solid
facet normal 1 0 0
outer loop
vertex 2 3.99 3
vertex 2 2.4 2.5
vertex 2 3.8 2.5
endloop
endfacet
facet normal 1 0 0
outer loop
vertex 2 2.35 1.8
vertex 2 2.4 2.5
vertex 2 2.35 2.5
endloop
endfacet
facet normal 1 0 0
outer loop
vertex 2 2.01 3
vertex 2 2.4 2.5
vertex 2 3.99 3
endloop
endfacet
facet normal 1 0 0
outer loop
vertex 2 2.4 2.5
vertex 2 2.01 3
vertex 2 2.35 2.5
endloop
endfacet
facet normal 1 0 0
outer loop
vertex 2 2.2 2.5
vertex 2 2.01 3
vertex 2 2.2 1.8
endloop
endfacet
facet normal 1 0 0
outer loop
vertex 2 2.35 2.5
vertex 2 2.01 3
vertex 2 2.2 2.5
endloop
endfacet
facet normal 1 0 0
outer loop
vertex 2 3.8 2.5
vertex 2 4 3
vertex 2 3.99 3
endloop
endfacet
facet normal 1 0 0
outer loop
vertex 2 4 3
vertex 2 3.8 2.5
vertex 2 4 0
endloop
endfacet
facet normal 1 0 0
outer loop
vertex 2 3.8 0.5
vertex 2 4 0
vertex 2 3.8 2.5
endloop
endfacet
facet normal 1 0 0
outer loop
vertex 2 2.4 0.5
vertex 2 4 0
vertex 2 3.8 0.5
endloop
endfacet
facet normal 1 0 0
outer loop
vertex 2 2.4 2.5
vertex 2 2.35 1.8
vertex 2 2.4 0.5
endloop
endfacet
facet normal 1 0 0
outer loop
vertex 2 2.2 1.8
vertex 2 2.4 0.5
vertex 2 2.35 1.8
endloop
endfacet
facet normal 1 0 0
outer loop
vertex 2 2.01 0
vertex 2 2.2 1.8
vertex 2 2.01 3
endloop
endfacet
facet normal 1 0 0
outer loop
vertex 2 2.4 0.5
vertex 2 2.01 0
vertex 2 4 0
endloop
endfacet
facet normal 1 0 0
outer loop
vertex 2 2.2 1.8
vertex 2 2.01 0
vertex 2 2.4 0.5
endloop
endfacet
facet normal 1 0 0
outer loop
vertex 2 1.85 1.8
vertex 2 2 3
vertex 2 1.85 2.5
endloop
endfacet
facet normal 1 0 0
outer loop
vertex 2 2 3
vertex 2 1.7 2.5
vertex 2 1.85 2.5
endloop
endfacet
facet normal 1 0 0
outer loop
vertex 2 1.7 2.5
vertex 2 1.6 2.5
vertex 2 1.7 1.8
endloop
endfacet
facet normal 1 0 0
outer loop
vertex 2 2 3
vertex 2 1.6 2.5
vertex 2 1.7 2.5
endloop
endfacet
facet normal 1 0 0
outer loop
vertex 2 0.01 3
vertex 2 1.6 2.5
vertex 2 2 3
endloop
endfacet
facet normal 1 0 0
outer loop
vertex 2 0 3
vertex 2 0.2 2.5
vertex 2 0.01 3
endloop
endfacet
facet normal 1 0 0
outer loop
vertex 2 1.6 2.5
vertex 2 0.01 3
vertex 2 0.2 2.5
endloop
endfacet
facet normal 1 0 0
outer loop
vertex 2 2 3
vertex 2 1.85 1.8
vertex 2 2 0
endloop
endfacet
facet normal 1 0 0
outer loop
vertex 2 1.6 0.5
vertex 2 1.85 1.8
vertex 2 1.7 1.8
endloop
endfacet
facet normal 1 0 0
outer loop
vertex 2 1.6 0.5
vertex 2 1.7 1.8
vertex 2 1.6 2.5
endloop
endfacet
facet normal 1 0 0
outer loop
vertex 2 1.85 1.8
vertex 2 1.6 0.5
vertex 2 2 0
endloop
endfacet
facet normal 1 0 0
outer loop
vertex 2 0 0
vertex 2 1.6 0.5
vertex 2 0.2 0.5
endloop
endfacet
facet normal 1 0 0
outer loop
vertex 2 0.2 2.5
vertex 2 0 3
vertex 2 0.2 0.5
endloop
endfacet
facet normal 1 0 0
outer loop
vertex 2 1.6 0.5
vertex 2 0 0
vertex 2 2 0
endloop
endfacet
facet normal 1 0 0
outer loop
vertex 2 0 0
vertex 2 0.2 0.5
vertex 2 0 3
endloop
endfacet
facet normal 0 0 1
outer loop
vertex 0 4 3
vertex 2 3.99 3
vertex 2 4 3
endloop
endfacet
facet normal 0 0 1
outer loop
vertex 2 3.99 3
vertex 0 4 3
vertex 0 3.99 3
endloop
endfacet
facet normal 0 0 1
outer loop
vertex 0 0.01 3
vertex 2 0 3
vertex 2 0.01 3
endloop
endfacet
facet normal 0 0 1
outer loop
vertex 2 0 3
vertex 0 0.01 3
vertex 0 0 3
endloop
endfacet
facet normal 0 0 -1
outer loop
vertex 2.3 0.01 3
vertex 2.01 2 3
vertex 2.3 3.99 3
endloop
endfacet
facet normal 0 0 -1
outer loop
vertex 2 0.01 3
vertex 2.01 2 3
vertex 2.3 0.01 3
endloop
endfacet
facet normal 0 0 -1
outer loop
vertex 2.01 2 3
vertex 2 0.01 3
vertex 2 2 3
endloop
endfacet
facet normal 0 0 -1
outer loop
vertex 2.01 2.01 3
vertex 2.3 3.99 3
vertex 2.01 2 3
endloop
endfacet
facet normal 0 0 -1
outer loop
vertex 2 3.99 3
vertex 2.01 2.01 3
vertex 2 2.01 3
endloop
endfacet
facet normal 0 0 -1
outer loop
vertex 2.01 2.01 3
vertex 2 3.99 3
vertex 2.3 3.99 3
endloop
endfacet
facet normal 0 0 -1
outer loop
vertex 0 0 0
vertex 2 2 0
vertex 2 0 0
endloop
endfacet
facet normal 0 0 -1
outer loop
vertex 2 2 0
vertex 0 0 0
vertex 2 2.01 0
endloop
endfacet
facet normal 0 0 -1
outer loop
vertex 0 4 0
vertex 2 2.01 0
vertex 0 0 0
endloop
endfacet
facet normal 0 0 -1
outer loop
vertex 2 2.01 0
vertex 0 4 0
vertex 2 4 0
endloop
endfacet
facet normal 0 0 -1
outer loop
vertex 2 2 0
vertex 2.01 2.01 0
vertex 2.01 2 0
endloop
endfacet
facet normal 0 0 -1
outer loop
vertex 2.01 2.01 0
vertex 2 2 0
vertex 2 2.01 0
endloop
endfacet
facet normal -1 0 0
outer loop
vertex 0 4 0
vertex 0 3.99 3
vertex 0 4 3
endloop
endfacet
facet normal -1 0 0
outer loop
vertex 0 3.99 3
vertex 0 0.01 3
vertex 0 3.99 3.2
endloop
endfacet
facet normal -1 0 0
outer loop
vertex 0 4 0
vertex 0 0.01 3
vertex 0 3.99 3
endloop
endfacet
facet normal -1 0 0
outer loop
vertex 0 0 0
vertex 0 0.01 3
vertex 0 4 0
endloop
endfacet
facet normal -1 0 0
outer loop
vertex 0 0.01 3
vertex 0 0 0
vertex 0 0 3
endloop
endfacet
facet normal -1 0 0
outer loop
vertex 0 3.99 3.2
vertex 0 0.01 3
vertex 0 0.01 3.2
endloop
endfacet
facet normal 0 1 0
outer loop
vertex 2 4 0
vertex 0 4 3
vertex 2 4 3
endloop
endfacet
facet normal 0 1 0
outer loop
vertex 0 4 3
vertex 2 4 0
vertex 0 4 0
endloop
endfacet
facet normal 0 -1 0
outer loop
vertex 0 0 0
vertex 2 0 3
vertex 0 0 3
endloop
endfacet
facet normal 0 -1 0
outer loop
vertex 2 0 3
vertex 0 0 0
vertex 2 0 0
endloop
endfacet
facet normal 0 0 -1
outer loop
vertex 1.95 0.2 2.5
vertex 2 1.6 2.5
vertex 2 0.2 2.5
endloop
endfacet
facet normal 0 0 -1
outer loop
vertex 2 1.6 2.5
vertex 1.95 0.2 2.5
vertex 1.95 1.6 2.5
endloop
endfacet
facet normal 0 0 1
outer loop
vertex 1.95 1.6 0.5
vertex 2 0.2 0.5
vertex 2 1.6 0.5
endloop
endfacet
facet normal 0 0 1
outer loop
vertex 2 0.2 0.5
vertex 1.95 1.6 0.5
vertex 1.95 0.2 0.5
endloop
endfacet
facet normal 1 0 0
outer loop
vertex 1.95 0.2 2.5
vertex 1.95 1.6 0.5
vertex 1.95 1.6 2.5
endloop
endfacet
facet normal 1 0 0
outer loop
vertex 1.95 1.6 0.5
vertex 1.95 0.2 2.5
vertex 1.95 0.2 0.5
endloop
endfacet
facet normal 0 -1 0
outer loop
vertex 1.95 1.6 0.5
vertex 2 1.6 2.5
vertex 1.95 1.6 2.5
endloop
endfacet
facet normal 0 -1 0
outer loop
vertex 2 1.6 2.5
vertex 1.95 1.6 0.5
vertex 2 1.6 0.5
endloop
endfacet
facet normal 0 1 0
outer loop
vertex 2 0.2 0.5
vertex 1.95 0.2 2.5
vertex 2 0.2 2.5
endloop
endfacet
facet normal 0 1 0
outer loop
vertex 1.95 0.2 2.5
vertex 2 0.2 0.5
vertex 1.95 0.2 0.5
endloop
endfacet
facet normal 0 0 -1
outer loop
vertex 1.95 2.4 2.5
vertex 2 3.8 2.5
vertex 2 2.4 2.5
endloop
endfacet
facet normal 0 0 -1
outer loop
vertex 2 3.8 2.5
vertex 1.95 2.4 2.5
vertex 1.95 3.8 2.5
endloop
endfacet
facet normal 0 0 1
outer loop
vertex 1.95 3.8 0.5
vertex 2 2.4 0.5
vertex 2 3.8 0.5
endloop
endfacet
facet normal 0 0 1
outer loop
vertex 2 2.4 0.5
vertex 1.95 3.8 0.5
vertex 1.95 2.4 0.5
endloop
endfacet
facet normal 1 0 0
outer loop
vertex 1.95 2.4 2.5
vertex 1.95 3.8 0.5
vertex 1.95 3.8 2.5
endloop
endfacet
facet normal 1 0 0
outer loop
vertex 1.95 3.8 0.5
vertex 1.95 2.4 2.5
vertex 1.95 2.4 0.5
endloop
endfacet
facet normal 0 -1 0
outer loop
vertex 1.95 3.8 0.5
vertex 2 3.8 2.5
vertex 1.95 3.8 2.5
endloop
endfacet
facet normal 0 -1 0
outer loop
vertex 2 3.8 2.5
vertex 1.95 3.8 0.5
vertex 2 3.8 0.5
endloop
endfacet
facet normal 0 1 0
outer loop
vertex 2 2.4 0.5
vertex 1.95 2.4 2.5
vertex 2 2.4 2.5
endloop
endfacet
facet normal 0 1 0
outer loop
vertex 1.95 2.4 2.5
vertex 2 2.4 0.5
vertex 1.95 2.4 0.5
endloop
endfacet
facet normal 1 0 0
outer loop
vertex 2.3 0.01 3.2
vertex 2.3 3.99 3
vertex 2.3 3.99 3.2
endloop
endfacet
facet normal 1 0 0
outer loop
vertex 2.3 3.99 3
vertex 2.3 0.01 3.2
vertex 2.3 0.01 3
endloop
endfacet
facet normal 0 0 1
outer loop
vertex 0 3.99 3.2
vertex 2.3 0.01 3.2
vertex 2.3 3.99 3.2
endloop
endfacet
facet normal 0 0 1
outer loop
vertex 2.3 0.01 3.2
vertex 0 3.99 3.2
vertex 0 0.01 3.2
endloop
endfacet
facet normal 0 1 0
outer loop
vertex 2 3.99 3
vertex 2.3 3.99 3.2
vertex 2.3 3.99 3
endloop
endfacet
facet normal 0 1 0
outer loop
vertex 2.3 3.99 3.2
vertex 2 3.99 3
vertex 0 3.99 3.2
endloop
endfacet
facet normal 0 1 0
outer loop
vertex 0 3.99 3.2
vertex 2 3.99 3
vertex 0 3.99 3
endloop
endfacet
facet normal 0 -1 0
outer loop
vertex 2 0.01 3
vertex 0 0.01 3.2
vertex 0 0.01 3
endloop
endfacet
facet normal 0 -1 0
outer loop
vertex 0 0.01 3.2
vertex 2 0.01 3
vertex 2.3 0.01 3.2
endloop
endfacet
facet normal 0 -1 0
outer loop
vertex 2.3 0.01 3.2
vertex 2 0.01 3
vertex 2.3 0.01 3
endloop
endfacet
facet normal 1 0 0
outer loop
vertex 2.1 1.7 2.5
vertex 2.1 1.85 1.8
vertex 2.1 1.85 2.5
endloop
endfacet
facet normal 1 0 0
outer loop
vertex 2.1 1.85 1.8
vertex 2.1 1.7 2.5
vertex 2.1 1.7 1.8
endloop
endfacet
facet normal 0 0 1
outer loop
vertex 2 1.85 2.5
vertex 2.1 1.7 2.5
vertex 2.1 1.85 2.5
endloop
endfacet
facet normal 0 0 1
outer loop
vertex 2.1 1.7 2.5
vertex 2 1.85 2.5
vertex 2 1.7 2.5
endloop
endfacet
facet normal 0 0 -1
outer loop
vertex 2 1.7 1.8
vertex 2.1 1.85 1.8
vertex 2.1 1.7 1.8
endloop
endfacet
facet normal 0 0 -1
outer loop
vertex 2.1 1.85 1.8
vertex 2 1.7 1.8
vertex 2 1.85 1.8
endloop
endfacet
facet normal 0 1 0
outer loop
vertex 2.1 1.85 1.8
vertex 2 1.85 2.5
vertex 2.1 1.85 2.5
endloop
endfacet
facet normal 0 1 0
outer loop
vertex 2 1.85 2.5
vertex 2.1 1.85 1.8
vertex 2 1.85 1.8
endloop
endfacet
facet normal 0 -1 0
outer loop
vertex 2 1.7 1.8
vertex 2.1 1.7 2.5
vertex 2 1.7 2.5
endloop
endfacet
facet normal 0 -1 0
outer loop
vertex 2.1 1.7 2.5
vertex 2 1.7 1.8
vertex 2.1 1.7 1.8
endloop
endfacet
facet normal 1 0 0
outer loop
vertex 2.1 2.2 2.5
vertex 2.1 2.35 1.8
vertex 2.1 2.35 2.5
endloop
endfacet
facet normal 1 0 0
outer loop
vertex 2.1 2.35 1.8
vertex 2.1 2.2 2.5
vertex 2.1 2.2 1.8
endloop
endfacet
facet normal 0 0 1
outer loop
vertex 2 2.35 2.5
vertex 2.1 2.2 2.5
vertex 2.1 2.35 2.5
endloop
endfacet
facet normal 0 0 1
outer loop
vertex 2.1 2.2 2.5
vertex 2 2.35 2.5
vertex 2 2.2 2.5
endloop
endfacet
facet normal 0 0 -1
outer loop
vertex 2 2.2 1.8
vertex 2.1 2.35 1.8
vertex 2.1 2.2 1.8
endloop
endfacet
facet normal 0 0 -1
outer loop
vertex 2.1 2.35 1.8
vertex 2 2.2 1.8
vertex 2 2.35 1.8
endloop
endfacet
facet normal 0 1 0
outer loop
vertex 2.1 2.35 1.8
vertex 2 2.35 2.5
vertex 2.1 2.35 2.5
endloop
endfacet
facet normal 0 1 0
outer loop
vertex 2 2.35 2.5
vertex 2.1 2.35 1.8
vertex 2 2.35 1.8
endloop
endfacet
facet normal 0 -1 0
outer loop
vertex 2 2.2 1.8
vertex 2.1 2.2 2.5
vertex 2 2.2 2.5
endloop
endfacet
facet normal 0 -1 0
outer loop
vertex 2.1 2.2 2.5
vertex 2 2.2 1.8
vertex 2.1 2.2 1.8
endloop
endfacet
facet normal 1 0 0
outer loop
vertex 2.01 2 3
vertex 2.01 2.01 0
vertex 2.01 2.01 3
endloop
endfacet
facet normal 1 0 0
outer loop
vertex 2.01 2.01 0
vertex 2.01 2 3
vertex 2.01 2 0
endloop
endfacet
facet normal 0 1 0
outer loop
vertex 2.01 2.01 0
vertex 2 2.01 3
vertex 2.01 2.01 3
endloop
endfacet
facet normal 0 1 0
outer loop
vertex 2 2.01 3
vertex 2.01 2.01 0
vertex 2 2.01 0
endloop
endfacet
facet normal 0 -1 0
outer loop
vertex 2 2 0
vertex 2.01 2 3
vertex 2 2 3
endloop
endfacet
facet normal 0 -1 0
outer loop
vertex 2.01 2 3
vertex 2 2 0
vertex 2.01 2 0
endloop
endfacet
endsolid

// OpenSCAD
module Base_cabinet_Wood(){

    translate([0,0.01,3])
    color("#8b6914")
    cube([2.3,3.98,0.2]);

    difference(){
    color("#cdaa7d")
    cube([2,4,3]);

    translate([1.95,0.2,0.5])
    color("#cdaa6f")
    cube([0.1,1.4,2]);

    translate([1.95 ,2.4,0.5])
    color("#cdaa6f")
    cube([0.1,1.4,2]);
    }

    translate([2,1.7,1.8])
    color("#8b6914")
    cube([0.1,0.15,0.7]);


    translate([2,2.2,1.8])
    color("#8b6914")
    cube([0.1,0.15,0.7]);


    translate([2,2,0])
    color("#000000")
    cube([0.01,0.01,3]);

}

Base_cabinet_Wood();
